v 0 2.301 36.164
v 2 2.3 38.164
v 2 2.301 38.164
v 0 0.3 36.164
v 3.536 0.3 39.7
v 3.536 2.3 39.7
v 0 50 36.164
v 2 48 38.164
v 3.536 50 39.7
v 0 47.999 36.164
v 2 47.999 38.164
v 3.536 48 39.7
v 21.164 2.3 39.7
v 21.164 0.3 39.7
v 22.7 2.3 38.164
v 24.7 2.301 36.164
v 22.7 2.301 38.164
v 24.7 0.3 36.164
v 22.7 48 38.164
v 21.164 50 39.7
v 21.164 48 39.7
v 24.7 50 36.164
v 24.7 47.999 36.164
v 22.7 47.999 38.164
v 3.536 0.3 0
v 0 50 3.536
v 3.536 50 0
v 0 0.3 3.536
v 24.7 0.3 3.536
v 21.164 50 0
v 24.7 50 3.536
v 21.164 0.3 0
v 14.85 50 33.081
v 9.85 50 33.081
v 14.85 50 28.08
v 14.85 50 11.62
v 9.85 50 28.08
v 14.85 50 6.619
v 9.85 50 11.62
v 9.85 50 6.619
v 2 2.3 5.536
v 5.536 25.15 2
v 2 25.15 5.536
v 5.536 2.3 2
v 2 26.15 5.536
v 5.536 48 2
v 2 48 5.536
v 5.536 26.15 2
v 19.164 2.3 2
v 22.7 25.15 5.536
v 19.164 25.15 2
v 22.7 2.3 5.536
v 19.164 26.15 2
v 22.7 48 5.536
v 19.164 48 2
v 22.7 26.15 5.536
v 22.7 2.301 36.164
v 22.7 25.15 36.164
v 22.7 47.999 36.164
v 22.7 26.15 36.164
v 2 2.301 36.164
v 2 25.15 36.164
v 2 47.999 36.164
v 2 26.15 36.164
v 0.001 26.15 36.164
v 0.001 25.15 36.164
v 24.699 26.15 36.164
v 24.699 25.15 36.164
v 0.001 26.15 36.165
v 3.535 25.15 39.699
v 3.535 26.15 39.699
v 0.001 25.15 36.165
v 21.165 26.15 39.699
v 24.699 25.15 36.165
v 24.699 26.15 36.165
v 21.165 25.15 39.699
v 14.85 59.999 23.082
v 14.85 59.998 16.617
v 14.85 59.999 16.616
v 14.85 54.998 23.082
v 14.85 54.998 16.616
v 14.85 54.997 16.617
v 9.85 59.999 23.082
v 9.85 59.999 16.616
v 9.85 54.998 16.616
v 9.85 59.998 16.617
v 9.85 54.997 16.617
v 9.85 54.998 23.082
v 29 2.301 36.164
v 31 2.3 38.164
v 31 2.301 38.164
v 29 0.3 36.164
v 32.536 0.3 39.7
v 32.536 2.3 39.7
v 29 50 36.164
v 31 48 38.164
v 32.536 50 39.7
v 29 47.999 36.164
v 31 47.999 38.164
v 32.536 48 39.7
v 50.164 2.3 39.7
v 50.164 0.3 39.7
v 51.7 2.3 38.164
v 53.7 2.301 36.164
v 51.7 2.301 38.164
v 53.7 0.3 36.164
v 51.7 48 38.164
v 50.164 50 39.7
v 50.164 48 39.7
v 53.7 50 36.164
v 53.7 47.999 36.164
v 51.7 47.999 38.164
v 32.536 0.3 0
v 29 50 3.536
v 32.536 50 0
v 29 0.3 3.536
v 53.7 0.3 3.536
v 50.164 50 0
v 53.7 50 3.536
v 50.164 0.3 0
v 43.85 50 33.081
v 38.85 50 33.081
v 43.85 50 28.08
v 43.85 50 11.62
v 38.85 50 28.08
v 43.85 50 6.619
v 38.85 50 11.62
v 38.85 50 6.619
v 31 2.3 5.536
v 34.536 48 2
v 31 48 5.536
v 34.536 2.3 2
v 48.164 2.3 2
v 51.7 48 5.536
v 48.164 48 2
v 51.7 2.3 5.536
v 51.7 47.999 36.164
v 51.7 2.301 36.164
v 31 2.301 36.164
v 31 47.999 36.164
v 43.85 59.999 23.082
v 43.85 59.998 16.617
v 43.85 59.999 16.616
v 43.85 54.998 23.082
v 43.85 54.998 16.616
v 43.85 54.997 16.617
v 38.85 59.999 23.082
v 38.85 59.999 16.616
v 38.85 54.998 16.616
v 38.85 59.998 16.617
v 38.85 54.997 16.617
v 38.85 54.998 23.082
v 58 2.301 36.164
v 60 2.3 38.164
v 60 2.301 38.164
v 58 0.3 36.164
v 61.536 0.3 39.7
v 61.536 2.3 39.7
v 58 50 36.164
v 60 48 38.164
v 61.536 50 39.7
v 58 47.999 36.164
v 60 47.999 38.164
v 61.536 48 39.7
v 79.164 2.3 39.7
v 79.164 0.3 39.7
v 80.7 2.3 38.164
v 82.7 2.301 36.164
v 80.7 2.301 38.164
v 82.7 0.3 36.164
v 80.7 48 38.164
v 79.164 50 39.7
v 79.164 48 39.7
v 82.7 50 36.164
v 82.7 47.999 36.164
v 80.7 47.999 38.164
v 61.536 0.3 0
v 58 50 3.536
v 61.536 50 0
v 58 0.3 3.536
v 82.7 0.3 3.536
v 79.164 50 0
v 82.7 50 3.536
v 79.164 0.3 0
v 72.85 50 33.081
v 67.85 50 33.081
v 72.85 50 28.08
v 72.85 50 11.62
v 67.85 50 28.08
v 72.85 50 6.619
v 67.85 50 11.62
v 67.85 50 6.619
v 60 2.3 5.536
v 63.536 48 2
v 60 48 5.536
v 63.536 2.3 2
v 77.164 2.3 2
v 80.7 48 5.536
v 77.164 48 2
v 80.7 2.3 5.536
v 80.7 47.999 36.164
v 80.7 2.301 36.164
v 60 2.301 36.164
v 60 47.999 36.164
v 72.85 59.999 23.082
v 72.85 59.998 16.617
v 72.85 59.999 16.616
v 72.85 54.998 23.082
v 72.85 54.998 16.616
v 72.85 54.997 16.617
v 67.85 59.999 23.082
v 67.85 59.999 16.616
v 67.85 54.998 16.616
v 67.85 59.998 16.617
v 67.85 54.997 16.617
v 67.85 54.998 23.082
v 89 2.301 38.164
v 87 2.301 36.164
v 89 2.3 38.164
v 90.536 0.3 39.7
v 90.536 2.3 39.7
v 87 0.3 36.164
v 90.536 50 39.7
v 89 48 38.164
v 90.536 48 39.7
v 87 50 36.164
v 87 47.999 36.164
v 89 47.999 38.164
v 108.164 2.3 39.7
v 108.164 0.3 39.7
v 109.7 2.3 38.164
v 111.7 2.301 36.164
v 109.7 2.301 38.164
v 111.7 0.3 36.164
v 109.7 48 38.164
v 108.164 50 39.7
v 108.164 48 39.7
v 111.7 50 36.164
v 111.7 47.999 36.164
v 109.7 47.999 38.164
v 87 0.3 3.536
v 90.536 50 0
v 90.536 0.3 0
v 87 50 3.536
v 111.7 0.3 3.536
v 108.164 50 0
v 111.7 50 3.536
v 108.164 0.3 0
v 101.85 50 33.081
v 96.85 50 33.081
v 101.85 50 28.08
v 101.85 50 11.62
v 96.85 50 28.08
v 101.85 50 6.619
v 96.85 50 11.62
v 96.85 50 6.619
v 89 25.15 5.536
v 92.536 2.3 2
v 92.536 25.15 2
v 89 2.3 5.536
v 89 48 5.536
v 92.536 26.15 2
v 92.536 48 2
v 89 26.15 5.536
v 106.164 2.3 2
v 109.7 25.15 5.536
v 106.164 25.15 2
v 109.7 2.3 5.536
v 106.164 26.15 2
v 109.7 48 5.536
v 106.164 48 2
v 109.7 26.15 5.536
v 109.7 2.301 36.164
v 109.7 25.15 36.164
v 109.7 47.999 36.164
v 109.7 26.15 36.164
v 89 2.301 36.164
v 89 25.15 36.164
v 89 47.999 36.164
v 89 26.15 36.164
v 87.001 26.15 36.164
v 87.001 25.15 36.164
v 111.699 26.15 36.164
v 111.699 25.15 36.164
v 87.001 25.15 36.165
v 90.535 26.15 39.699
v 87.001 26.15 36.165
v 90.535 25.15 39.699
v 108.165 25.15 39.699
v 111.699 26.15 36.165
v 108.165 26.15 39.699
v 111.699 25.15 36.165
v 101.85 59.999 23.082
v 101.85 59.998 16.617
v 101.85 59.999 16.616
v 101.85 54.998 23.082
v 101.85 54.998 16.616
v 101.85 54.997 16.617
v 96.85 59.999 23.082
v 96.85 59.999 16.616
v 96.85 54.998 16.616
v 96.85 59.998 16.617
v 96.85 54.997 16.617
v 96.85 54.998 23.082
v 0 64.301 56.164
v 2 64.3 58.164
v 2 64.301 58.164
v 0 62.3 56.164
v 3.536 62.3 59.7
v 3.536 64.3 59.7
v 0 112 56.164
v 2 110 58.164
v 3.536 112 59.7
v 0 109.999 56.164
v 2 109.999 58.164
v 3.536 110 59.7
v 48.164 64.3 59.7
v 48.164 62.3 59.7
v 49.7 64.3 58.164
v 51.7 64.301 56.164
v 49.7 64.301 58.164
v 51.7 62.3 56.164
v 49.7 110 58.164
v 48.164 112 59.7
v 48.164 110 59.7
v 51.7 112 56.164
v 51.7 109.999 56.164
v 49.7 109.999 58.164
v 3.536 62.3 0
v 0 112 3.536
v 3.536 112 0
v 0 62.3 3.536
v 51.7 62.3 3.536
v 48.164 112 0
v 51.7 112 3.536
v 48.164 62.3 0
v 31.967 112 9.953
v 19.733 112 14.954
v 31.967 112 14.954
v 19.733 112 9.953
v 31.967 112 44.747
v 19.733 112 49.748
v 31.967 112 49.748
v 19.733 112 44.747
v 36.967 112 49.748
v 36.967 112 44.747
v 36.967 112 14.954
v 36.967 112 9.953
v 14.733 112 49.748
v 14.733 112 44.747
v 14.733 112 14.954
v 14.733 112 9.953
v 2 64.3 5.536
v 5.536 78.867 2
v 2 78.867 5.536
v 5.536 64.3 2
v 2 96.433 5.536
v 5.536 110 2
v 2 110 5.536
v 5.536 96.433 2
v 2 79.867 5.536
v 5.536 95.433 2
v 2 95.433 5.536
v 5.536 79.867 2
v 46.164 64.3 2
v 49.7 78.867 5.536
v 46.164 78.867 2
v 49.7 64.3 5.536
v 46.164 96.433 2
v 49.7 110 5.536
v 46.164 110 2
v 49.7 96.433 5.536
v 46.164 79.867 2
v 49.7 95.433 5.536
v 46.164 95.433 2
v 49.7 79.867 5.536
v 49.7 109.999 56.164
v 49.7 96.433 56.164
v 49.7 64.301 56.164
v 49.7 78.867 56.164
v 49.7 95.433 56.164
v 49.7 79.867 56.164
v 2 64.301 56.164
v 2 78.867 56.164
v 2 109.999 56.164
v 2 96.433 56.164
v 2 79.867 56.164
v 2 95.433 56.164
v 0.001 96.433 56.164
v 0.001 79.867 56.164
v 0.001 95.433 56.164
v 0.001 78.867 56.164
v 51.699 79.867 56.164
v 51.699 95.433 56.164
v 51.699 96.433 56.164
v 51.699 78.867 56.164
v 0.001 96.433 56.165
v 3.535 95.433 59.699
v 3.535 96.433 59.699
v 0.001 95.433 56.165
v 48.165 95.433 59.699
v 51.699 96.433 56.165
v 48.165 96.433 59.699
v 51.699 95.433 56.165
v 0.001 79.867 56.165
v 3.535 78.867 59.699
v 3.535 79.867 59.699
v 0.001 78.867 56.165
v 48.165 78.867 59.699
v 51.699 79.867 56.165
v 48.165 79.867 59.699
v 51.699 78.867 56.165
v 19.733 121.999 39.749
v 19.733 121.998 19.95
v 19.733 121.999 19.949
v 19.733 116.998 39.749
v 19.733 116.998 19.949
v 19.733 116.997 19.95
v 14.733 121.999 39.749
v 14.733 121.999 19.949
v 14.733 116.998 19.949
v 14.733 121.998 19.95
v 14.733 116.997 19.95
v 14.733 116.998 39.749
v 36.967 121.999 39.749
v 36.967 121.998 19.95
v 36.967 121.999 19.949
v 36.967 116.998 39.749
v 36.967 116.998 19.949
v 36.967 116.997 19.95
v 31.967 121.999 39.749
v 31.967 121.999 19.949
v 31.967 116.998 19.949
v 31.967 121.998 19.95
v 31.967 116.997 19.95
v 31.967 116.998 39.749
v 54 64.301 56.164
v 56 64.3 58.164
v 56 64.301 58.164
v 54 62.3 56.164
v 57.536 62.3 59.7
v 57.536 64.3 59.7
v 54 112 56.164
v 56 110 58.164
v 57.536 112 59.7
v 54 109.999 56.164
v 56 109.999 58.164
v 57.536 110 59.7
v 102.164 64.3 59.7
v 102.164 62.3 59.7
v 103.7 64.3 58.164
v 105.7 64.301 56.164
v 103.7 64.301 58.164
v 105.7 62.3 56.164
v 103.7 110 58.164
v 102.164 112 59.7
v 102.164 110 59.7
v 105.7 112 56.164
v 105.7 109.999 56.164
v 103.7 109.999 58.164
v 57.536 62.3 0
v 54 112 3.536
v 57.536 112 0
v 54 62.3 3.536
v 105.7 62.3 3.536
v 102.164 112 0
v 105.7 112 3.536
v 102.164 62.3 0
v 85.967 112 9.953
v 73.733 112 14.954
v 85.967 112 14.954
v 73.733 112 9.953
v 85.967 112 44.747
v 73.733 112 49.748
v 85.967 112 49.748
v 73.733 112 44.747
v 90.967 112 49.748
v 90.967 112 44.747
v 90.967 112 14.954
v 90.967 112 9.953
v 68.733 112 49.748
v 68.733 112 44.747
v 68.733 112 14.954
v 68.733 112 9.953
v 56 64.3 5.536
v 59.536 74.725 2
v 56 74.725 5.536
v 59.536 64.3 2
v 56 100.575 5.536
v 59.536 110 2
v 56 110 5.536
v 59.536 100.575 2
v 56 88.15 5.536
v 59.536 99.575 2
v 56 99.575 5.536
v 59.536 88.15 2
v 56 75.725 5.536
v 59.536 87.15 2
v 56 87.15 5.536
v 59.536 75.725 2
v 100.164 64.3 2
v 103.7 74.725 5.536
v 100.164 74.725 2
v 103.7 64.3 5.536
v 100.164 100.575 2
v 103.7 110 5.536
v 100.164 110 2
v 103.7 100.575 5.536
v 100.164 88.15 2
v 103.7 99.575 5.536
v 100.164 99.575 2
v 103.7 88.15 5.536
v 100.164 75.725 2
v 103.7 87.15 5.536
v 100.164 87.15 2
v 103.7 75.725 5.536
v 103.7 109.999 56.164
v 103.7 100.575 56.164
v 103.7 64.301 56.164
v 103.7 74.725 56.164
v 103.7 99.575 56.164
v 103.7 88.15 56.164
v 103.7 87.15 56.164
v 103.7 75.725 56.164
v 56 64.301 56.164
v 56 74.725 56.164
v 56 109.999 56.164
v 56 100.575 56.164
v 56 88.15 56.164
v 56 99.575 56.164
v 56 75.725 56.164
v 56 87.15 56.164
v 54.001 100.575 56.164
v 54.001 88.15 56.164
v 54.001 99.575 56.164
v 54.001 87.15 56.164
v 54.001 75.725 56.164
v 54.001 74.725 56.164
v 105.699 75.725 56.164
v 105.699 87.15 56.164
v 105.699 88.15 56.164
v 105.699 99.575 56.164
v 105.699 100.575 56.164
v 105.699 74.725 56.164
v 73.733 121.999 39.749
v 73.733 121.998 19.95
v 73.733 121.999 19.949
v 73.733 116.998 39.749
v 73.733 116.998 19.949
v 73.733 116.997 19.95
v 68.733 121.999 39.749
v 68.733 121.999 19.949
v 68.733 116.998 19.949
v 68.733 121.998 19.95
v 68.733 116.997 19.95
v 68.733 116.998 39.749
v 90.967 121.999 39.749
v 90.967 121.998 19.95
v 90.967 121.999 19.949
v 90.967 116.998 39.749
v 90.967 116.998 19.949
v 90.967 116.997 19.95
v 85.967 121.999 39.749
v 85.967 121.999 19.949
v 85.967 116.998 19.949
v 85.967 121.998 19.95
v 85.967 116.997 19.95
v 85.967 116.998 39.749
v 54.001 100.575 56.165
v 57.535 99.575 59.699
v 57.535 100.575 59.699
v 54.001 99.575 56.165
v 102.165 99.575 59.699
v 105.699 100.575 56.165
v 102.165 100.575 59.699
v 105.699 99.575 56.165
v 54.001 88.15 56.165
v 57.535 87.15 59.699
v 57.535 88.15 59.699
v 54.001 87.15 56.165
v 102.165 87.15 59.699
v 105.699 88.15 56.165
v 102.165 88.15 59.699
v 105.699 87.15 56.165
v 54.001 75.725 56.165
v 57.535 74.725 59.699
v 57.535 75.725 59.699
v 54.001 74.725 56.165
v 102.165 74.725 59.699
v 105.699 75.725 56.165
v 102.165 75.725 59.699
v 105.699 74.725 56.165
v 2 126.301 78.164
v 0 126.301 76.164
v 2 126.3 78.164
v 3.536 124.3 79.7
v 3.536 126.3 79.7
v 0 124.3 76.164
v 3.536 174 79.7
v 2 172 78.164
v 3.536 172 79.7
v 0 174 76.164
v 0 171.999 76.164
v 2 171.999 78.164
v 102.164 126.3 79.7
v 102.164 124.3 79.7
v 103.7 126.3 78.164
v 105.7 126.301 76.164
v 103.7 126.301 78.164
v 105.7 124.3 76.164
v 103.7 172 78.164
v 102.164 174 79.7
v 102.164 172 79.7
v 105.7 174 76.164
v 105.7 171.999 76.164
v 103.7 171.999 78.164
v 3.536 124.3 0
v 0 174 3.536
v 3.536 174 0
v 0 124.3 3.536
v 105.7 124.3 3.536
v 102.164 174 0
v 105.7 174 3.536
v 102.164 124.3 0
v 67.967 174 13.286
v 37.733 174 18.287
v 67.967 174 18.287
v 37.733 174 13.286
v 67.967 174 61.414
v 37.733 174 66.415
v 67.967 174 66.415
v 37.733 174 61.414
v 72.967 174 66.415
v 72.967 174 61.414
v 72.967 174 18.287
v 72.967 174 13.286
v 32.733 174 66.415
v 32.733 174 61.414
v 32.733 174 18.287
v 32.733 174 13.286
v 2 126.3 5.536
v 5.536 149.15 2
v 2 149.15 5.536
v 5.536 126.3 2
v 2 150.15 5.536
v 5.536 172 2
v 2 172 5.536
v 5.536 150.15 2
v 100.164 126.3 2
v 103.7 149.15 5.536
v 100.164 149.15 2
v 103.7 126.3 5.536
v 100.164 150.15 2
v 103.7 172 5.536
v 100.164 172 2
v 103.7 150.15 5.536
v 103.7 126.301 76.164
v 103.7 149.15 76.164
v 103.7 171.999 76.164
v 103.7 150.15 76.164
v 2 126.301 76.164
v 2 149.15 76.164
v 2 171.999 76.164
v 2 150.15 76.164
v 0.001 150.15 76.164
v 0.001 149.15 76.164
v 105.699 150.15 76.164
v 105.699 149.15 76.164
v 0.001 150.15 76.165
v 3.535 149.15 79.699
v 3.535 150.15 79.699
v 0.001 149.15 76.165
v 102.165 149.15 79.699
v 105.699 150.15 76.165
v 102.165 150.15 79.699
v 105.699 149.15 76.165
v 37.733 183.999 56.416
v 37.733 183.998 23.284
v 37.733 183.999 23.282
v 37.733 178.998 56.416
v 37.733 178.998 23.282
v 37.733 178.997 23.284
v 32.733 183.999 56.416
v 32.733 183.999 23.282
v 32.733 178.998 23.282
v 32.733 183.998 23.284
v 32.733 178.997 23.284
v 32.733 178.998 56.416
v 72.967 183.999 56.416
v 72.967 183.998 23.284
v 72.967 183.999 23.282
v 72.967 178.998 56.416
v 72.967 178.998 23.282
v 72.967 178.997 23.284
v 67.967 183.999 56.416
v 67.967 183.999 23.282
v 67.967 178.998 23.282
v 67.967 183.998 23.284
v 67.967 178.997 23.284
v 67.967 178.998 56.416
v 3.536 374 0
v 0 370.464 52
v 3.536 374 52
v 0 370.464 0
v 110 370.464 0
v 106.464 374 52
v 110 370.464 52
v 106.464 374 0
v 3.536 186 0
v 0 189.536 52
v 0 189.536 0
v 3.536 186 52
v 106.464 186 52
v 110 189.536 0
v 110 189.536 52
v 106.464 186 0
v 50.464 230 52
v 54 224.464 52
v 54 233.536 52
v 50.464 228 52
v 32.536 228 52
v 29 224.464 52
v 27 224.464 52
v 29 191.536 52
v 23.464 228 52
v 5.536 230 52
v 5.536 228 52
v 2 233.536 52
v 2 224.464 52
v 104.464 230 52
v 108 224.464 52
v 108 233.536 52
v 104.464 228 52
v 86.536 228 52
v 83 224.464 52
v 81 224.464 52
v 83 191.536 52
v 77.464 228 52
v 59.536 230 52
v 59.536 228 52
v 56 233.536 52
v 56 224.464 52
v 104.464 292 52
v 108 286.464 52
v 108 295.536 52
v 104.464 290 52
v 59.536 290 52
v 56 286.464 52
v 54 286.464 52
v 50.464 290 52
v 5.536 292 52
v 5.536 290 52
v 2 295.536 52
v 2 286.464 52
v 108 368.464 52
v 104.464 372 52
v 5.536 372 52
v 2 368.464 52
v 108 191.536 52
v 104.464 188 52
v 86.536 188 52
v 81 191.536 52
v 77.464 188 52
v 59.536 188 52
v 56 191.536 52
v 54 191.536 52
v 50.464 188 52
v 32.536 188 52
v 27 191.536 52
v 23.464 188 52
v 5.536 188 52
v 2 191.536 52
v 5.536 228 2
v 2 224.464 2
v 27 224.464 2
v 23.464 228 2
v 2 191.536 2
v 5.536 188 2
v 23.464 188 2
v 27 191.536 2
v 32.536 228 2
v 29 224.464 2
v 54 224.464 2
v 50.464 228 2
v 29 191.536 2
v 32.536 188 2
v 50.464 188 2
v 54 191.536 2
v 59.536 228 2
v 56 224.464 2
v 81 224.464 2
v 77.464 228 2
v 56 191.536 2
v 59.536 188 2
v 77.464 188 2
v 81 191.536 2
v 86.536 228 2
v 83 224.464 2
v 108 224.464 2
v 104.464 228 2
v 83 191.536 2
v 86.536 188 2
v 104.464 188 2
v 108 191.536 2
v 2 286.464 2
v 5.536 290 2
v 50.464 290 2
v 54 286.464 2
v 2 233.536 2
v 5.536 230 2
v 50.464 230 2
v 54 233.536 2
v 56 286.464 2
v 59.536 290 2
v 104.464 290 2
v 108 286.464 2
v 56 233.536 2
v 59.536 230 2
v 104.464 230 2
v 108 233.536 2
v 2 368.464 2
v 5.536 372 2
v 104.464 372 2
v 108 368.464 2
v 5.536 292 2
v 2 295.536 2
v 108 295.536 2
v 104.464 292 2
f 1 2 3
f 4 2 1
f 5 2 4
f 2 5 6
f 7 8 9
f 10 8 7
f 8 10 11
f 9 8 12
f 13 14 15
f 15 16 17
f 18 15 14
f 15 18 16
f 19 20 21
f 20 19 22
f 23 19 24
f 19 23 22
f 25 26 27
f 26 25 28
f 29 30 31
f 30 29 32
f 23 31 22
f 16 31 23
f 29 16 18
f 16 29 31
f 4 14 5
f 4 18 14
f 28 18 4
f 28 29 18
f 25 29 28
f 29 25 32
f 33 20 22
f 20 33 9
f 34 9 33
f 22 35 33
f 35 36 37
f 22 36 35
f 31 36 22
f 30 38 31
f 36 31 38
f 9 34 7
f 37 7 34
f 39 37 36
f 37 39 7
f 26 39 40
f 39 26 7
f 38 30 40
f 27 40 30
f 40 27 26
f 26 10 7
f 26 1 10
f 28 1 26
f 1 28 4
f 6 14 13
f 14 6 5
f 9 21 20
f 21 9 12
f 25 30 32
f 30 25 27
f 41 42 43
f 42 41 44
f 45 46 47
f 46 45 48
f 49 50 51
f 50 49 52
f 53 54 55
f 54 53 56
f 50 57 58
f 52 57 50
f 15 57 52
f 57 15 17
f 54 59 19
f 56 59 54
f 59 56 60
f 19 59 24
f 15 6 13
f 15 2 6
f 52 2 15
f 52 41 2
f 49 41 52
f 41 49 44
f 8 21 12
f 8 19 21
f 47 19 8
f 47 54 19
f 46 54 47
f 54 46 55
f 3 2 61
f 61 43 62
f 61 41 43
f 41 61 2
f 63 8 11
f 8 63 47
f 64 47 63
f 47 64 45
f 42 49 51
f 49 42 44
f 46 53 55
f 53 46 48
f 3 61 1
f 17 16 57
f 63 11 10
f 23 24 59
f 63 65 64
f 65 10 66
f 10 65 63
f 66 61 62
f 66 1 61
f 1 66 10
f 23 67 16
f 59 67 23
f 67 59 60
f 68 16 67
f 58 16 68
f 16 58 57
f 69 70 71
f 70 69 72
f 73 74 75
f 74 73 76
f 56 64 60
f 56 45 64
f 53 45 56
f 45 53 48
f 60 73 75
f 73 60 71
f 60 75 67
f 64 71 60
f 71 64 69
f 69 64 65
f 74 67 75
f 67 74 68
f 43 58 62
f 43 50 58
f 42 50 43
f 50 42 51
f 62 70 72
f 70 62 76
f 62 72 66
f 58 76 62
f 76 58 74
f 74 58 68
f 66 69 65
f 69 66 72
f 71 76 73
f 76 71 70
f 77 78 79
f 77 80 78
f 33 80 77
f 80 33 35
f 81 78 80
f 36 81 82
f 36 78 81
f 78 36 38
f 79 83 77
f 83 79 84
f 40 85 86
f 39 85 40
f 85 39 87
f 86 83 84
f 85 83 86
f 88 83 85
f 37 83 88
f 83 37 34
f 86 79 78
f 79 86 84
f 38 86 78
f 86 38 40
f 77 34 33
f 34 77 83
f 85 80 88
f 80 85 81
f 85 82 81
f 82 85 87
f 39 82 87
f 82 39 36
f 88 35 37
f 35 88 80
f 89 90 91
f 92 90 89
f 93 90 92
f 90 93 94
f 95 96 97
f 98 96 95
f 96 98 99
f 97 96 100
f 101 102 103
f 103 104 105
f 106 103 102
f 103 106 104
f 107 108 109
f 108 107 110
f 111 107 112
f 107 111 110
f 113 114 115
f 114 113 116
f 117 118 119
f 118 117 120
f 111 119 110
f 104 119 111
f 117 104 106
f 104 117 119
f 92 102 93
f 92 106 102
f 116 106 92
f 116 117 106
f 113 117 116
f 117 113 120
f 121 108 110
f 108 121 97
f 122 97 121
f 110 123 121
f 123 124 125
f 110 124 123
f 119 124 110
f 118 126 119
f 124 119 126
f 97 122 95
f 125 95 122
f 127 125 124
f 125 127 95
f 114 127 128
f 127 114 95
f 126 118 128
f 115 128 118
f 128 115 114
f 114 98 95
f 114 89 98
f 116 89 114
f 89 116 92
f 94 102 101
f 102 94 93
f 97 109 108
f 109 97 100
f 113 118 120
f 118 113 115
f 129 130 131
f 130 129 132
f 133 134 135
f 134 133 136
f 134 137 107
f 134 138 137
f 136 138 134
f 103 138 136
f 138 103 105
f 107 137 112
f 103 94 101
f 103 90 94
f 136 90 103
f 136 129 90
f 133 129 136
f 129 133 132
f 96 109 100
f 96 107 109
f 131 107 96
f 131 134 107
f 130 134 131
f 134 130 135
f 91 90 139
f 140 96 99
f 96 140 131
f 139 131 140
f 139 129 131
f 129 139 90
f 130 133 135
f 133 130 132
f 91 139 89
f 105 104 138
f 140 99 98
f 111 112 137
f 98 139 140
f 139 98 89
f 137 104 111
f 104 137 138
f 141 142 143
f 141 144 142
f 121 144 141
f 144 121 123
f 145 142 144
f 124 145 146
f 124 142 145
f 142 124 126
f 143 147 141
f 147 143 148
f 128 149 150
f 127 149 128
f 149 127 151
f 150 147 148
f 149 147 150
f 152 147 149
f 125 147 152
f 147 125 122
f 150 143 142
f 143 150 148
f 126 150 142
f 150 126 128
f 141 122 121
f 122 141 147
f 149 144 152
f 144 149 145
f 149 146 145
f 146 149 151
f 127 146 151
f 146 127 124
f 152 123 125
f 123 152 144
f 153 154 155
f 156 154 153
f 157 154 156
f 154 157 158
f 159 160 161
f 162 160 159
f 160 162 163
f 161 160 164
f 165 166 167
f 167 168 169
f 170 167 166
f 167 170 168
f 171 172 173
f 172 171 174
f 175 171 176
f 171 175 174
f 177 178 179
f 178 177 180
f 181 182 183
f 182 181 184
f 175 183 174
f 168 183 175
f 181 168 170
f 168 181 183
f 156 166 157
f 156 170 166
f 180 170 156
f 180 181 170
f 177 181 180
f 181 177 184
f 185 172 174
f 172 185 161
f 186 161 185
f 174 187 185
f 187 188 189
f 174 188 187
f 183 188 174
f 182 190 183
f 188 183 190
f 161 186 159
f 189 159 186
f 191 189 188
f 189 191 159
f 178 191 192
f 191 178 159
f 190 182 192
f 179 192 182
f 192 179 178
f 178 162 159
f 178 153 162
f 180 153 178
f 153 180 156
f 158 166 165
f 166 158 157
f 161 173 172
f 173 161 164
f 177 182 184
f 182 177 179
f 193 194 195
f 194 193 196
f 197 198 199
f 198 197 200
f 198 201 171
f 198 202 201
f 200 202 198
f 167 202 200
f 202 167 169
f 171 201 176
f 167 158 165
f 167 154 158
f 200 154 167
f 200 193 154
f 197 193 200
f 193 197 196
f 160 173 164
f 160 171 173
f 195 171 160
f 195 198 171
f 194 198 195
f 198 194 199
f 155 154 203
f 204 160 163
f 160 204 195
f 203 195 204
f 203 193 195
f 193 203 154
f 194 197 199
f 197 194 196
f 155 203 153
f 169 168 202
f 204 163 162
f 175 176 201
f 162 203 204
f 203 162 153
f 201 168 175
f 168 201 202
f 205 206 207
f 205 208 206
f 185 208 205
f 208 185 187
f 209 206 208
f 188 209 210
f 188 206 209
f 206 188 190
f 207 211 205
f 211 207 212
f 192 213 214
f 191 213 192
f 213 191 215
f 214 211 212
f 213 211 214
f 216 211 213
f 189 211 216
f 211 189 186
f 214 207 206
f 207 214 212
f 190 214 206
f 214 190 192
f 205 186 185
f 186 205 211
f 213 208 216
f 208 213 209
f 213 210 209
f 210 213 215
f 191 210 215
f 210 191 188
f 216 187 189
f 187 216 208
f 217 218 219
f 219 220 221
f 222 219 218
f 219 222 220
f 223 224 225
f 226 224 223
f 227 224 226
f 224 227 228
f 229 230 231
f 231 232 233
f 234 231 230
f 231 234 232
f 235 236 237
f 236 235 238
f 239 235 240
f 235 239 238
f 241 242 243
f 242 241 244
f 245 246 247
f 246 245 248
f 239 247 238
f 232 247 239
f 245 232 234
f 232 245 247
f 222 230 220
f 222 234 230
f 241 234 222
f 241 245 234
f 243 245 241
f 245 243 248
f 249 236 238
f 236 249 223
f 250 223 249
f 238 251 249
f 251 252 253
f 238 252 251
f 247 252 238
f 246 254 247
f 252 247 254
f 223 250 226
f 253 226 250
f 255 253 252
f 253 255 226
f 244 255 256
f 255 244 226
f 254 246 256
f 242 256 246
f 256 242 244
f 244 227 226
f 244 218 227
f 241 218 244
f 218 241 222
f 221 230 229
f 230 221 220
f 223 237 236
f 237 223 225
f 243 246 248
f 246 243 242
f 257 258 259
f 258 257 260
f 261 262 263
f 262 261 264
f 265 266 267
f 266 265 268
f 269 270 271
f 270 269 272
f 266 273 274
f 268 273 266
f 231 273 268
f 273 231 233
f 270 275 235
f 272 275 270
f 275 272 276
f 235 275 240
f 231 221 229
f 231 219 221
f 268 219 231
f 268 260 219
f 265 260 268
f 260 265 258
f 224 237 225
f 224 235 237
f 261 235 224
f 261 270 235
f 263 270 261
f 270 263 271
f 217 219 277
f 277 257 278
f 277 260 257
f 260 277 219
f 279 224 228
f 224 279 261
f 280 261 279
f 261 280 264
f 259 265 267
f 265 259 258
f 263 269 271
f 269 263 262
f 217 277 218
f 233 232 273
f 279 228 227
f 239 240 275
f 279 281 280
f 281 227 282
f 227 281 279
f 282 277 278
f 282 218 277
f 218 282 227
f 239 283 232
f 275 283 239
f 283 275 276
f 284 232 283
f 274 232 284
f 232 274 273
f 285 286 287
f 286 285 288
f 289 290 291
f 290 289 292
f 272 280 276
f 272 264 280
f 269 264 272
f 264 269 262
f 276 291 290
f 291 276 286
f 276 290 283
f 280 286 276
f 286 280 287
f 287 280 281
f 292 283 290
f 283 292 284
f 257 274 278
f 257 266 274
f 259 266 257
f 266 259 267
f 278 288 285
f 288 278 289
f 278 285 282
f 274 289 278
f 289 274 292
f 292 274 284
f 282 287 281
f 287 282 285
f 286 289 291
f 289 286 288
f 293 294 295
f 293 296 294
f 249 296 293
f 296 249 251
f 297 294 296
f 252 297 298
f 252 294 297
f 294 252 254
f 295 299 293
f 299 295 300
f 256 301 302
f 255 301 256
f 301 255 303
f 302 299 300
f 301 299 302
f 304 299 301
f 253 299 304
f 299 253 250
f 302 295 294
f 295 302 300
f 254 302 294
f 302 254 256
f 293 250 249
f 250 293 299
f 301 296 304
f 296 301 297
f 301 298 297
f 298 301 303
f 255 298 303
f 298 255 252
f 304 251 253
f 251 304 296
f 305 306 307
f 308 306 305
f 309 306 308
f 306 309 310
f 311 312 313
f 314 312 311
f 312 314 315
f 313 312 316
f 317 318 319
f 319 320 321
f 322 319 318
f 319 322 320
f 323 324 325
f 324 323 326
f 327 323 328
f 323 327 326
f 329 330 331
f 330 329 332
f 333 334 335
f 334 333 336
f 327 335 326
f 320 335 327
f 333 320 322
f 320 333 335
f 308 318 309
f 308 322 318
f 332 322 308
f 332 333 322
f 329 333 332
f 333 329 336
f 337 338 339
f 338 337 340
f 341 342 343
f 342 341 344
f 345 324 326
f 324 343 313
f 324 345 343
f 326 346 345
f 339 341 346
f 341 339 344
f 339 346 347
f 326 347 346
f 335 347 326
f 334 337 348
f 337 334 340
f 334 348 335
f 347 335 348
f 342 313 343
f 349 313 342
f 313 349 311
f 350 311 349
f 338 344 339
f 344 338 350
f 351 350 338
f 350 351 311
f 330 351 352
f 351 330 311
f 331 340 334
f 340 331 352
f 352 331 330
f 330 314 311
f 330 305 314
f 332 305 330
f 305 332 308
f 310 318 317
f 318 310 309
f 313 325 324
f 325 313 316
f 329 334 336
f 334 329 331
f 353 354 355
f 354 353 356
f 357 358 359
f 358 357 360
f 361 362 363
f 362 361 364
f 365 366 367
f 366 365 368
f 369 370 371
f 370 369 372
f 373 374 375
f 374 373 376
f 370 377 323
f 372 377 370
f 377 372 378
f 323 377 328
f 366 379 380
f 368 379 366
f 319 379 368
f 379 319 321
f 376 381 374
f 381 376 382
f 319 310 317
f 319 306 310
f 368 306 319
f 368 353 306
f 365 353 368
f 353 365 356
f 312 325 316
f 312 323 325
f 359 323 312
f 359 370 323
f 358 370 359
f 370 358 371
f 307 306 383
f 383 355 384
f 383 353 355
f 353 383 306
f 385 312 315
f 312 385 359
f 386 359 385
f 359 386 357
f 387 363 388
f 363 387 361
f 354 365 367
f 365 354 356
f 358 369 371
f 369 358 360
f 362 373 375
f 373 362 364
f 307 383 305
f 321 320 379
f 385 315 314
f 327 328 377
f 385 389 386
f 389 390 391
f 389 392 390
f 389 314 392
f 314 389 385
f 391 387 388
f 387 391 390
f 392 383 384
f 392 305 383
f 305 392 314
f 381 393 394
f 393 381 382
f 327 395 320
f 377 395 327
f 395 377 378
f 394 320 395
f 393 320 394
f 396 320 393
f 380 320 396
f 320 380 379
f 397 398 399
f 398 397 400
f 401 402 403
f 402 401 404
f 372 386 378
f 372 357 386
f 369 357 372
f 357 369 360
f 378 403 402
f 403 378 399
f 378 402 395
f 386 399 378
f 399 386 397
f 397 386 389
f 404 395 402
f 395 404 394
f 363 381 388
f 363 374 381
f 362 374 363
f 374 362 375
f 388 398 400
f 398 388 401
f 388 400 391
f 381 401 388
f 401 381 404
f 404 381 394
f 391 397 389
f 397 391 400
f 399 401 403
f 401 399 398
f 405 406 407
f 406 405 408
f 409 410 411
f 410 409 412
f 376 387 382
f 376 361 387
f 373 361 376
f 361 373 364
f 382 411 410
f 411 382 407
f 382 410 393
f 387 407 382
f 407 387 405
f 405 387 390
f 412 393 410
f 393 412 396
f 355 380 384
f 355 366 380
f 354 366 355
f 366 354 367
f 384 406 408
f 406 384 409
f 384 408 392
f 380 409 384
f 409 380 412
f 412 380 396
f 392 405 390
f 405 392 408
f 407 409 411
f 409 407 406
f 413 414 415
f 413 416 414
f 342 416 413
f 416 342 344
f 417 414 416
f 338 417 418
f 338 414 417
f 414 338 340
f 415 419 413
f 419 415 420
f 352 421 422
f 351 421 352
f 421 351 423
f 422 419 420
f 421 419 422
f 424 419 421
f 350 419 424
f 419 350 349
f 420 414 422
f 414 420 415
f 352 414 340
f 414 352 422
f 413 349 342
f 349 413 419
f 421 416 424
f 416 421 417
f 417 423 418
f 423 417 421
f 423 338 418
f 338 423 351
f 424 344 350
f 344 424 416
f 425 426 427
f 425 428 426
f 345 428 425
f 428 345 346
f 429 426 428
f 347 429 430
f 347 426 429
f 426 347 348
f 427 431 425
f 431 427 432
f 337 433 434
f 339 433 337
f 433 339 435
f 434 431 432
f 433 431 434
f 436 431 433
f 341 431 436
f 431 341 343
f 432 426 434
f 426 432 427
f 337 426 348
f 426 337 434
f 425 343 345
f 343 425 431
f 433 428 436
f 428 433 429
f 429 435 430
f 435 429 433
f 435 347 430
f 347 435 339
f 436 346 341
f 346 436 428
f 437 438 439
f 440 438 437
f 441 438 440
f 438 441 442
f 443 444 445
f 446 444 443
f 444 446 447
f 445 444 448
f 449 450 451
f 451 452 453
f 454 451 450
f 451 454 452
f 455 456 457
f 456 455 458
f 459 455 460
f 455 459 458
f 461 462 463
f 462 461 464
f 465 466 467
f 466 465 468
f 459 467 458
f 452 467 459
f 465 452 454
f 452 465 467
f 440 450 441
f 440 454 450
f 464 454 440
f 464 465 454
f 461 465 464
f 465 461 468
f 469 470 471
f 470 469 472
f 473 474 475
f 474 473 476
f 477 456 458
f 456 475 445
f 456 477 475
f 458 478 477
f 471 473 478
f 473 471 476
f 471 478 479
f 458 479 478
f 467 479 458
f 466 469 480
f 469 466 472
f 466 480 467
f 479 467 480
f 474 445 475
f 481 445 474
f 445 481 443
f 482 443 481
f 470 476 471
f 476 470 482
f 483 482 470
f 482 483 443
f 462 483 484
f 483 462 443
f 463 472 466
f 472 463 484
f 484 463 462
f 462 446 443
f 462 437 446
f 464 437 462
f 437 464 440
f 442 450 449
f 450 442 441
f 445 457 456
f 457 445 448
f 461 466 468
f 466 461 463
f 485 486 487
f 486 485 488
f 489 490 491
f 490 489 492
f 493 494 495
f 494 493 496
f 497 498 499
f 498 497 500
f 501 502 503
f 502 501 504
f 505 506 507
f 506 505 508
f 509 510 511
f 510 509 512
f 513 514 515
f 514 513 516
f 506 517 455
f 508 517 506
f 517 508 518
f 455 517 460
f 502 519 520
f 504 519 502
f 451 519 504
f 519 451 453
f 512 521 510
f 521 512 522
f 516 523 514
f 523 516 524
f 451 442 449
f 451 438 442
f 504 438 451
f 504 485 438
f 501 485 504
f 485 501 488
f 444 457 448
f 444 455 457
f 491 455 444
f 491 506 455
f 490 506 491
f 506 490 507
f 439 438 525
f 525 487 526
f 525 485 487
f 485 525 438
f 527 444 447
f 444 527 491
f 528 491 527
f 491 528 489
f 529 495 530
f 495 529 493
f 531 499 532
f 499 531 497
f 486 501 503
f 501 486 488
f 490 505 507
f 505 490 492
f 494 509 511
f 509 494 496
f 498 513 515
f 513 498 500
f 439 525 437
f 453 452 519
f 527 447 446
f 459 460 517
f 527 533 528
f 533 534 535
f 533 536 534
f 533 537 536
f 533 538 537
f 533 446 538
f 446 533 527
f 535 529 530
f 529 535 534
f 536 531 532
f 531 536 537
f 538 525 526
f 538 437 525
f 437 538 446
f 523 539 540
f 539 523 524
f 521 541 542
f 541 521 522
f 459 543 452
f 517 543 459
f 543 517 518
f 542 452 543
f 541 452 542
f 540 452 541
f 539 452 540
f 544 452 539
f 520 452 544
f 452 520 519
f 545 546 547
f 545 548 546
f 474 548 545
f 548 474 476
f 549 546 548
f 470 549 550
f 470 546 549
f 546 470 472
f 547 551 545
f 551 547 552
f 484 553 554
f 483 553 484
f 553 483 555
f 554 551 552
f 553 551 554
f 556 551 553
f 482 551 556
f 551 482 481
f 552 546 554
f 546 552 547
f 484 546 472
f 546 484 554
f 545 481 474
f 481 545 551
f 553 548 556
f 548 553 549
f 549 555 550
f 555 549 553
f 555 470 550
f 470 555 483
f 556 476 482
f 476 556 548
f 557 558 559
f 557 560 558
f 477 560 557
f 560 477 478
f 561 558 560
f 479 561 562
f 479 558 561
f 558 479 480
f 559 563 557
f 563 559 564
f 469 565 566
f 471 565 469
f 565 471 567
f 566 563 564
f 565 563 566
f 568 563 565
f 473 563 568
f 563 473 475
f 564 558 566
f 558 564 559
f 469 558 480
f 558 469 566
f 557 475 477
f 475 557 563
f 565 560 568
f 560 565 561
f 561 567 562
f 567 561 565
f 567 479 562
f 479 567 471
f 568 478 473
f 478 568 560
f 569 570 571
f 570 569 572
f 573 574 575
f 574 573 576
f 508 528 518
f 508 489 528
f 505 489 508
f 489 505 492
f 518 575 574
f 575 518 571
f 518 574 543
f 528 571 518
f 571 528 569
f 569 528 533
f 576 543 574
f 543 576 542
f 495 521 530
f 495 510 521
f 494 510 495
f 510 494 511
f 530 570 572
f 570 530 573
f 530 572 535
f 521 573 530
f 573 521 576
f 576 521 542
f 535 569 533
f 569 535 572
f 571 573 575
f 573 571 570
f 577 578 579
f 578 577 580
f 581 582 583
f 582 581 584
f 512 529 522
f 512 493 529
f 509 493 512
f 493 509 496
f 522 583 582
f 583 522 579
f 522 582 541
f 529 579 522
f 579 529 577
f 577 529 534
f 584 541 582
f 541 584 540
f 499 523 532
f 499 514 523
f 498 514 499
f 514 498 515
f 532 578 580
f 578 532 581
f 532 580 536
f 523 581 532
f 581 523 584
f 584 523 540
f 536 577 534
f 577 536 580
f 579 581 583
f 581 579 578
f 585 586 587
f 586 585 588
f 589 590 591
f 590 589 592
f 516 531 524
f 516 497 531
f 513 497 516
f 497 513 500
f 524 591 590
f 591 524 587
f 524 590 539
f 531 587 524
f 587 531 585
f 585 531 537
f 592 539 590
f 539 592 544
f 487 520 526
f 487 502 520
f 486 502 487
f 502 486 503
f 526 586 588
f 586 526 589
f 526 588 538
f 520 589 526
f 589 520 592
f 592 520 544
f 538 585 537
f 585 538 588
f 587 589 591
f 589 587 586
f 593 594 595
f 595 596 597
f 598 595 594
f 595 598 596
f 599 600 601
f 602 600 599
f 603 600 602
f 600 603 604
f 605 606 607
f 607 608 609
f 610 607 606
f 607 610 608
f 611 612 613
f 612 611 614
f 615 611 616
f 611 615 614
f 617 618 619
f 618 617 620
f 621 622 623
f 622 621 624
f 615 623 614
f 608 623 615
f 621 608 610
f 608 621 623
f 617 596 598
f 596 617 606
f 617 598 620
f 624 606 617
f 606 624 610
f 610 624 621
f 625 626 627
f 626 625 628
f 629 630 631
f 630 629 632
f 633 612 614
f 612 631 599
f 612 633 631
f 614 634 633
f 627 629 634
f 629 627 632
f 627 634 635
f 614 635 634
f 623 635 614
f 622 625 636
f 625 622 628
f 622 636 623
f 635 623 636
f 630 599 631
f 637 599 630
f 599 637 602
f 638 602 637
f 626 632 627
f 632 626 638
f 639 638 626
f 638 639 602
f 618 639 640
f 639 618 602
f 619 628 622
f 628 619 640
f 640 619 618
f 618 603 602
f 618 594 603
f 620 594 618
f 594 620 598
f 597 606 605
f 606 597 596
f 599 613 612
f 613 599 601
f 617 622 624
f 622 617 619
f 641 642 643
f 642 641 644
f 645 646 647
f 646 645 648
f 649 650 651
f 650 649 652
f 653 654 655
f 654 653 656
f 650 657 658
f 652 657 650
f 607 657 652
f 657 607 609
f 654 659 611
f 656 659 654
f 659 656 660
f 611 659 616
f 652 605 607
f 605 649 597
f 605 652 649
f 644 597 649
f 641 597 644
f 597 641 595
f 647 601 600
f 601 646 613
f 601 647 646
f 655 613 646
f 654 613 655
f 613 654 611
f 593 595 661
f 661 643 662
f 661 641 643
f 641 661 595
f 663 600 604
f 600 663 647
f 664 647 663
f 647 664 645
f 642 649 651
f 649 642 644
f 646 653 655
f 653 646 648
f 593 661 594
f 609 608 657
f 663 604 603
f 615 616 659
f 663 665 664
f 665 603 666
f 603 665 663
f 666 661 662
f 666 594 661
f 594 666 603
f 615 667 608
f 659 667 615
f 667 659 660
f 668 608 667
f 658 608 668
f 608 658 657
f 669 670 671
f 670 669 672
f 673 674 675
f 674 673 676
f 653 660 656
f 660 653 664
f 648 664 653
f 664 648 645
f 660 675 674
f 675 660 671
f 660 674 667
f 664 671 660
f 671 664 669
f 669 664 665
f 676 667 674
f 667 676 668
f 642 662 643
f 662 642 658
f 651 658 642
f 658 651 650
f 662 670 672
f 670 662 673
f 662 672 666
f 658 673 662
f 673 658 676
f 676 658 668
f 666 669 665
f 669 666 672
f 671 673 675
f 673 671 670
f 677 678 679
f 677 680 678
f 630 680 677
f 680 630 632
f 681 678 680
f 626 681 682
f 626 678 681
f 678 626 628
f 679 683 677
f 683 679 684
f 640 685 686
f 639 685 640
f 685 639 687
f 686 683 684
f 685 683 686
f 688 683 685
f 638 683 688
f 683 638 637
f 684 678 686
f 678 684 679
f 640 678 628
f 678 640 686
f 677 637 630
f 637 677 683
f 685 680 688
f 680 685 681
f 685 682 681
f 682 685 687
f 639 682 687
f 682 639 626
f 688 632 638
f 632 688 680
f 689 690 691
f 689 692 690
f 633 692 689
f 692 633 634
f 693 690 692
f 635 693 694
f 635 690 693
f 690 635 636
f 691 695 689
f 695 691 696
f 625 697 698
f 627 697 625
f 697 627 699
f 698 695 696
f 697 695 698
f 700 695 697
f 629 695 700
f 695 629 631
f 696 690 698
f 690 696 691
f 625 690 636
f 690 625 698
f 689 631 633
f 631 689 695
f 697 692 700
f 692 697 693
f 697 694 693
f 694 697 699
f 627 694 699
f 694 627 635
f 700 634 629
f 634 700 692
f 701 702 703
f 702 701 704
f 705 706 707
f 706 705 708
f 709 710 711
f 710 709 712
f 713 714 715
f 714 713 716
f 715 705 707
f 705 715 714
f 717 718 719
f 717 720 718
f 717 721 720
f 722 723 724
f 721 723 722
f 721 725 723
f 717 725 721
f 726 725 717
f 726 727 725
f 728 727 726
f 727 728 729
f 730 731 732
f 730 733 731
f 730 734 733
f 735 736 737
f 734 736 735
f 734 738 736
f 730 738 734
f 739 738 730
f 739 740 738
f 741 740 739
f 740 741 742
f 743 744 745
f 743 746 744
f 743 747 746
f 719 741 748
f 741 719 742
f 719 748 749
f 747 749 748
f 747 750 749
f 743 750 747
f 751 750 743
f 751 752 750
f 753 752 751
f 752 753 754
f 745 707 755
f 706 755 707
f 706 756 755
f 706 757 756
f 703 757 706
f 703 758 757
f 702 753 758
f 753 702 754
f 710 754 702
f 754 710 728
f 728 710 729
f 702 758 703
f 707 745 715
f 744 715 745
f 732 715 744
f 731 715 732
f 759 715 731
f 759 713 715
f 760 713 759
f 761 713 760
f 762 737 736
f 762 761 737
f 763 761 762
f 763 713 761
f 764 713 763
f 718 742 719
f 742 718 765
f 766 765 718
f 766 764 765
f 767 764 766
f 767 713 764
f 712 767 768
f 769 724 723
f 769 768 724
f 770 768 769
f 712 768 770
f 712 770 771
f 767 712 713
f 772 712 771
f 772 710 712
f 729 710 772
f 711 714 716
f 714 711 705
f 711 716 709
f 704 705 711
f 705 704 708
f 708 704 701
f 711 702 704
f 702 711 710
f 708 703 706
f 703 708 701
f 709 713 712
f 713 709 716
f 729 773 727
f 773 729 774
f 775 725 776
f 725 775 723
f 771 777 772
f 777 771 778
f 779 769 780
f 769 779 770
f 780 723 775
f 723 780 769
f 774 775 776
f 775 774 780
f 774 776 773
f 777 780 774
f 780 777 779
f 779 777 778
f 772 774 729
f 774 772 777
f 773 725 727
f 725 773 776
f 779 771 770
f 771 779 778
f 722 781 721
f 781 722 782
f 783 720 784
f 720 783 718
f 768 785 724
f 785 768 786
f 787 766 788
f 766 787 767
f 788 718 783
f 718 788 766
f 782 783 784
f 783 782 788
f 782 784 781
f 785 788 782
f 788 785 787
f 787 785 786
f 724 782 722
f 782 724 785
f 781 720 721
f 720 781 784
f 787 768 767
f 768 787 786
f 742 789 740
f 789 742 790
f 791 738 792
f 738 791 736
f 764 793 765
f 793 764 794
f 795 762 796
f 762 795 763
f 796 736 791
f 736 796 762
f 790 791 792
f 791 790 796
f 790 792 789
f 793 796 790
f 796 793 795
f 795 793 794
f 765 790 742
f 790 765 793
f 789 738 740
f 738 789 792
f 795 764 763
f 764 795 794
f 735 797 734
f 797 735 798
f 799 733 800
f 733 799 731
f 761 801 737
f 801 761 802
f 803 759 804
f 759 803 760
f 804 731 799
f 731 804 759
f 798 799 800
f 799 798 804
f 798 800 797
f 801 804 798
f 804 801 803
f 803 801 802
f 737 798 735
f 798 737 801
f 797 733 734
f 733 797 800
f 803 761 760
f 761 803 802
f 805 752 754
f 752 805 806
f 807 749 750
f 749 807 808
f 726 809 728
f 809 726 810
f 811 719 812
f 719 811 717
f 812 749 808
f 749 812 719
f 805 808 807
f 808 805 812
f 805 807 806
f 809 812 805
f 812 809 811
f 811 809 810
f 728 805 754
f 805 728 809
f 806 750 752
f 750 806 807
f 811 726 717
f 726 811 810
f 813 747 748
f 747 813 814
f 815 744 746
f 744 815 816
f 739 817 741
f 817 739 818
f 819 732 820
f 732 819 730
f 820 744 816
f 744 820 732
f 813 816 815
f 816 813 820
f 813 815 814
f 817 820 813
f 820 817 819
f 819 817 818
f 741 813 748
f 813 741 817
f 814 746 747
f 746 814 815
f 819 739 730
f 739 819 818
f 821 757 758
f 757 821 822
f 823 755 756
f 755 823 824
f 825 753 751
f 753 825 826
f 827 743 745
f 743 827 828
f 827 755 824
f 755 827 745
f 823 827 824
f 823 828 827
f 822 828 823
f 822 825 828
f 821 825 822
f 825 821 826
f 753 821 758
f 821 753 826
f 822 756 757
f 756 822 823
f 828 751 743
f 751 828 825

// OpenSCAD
// preview[view:north west, tilt:top diagonal]

/* [Basics] */
// Units in mm that make up the width of the drawers
unit_width = 25; // [10:100]
// Units in mm that make up the height of the drawers
unit_height = 20; // [10:100]
// Depth front-to-back of all drawers in mm
unit_depth = 50; // [20:200]
// Thickness of handle in mm
handle_thickness=5; // [3:30]
// Depth of handle in mm
handle_depth=10; // [10:50]
// Thickness of the walls in mm (drawer walls and gap between drawers)
wall = 2; // [1:10]
// Size of bevel in mmon corners 
bevel = 5; // [0:20]
// Space in mm between components on the bed
print_space = 2;

/* [Drawers] */

// ## Complex example ##
// Unit width of each drawer
widths = [[1, 1, 1, 1], [2, 2], [4]];
// Unit height of each drawer
heights = [[2, 2, 2, 2], [3, 3], [4]];
// Number of dividers in each drawer
dividers = [[1, 0, 0, 1], [2, 3], [1]];
// Number of handles on the front of each drawer
handles = [[1, 1, 1, 1], [2, 2], [2]];

module simple_example() {
    // ## Simple example ##
    // Unit width of each drawer
    widths = [[1, 1], [2]];
    // Unit height of each drawer
    heights = [[1, 1], [1]];
    // Number of dividers in each drawer
    dividers = [[1, 1], [1]];
    // Number of handles on the front of each drawer
    handles = [[1, 1], [2]];
}

module super_simple_example() {
    // ## Super Simple Single Drawer example ##
    // Width in width units of each drawer
    widths = [[3]];
    // Height in height units of each drawer
    heights = [[4]];
    // Number of dividers in each drawer
    dividers = [[1]];
    // Number of handles on the front of each drawer
    handles = [[2]];
}

/* [Global] */
// What part(s) do you want to look at?
part = "both"; // [drawers:Drawers Only,frame:Frame Only,both:Drawers and Frame]

// Include the drawers
drawers = part == "drawers" || part == "both";
// Include the frame
frame = part == "frame" || part == "both";

module go() {
    // Tolerance space between sliding parts
    sliding_tol = 0.3;
    // Separator used to avoid congruent vertices/lines/planes
    sep = 0.001;
    hb = bevel / 2;

    // Flatten a vector of vectors
    function flatten(a) = [for (a = l) for (b = a) b];
    // Sum first n terms, defaults to all terms
    function sum(a, n=-1, i=0, t=0) = i < len(a) && i != n ? sum(a, n, i + 1, t + a[i]) : t;

    module bevel(depth) {
        // Build a subtractive bevel with x-section bevel squared and supplied depth 
        rotate(45) translate([-hb, -hb, -1]) cube([bevel, bevel, depth + 2]);
    }

    module bevel_box(width, height, depth, bevel, bevel_top=true) {
        // Build a box with a bevelled edge
        difference() {
            // Box
            cube([width, height, depth]);
            union() {
                // Bevels
                translate([0, 0, -1]) {
                    bevel(depth + 2);
                };
                translate([width, 0, -1]) {
                    bevel(depth + 2);
                };
                if (bevel_top) {
                    translate([0, height, -1]) {
                        bevel(depth + 2);
                    };
                    translate([width, height, -1]) {
                        bevel(depth + 2);
                    };
                }
            };
        }
    }

    module bevel_divider(drawer_id, divider_id, width, height, depth, bevel) {
        // build a bevel divider for given drawer
        // Depth is the mid point of the divider in the drawer
        // echo("Divider", drawer_id=drawer_id, divider_id=divider_id, width=width, height=height, depth=depth, bevel=bevel);
        translate([0, 0, depth])
        intersection() {
            difference() {
                bevel_box(width, height, unit_depth, bevel, true);
                // Keep from face of drawer
                translate([-sep, -sep, wall + sep])
                    cube([width + 2 * sep, height + 2 * sep, unit_depth]);
            }
            // Remove clashing vertices, edges and planes
            translate([sep, sep, -1]) 
                cube([width - 2 * sep, height - 2 * sep, 2]);
        }
    }

    module handle(drawer_id, handle_id, height, width, depth, thickness=handle_thickness) {
        // Build a handle with given width height and depth
        // Thickness is the handle size in mm
        // echo("Handle", drawer_id=drawer_id, handle_id=handle_id, height=height, width=width, depth=depth);
        
        module handle_shell(h, w, d, b) {
            // Build extruded trapezoid for handle
            difference() {
                cube([w, h, d]);
                translate([-sep, -sep, -d])
                    rotate([45, 0, 0]) 
                        cube([w + 2 * sep, b + 2 * sep, b]);
                translate([-sep, h - sep, -d])
                    rotate([45, 0, 0]) 
                        cube([w + 2 * sep, b + 2 * sep, b]);
            
            }
        }
        
        // Calculate the bevel edge length
        function bev(d, h) = pow(2 * pow(min(d, h/2), 2), 0.5);
        
        // Calculate handle cutout dimensions
        d2 = depth - thickness;
        h2 = height - 2 * thickness;
        // Calculate bevel size for exterior and interior
        b1 = bev(depth, height);
        b2 = bev(d2, h2);
        
        
        difference(){ 
            // Exterior of handle
            handle_shell(height, width, depth, b1);
            // Inner cut out of handle
            translate([-sep, thickness, thickness + sep]) 
                handle_shell(h2, width + 2 * sep, d2, b2);
        }
    }

    module lay() {
        // debug method
        if (true) {
            translate([0, unit_depth, 0])
                rotate([90, 0, 0])
                    children();
        } else {
            children();
        }
    }

    module drawer(id=1, width=1, height=1, handles=1, dividers=1, bevel=bevel, extra=0) {
        // Build a drawer with:
        //  width: mutiple of standard width
        //  height: mutiple of standard height
        //  handles: Given number of handles
        //  dividers: Number of drawer dividers
        //  bevel: Size of corner bevel
        //  extra: Extra value added to all dimensions for tolerances
        
        w = width * unit_width + (width - 1) * wall + extra;
        h = height * unit_height + extra;
        d = unit_depth + extra;
        // echo("Drawer", id=id, w=w, h=h, d=d);
        // echo(bevel=bevel, extra=extra);
        // echo(handles=handles, dividers=dividers);
        lay()
        union() {
            // Add drawer
            if (true) {
                difference() {
                    // Outer box
                    bevel_box(w, h, d, bevel);
                    // Inner space
                    translate([wall, wall, wall]) {
                        bevel_box(
                                w - 2 * wall, 
                                h + 2 * wall, 
                                d - 2 * wall,
                                bevel,
                                false);
                    };
                    hxb = pow(2 * pow(hb, 2), 0.5);
                    translate([-1, h - hxb, wall + sep]) {
                        cube([w + 2, hb + 2, d - 2 * wall - 2 * sep]);
                    }
                }
            }
            // Add dividers
            if (dividers > 0) {
                // echo(dividers=dividers);
                div_offset = d / (dividers + 1);
                for (divider = [0 + 1:dividers]) {
                    // echo(divider=divider);
                    bevel_divider(id, divider, w, h, div_offset * divider - wall / 2, bevel);
                }
            }
            // Add handles
            if (handles > 0) {
                // echo(handles=handles);
                handle_height = h / 1.5;
                handle_offset = w / (handles + 1);
                
                for (handle = [0 + 1:handles]) {
                    // echo(handle=handle);
                    offset_x = handle_offset * handle - handle_thickness / 2;
                    offset_y = (h - handle_height) / 2;
                    translate([offset_x, offset_y, -handle_depth + sep]) {
                        handle(id, handle, handle_height, handle_thickness, handle_depth);
                    }
                }
            }
        }
    }


    module build_drawers(widths, heights, dividers, handles) {
        // echo("===DRAWERS===");
        // Build each of the drawers
        for (row_id=[0:len(widths) - 1]) {
            row_widths = widths[row_id];
            row_heights = heights[row_id];
            row_dividers = dividers[row_id];
            row_handles = handles[row_id];
            
            max_row_width = max(row_widths);
            translate([0, row_id * (unit_depth + handle_depth + print_space), 0]) {
                for (drawer_id=[0:len(row_widths) - 1]) {
                    drawer_widths = row_widths[drawer_id];
                    drawer_heights = row_heights[drawer_id];
                    drawer_divides = row_dividers[drawer_id];
                    drawer_handles = row_handles[drawer_id];

                    // echo(row_id=row_id, drawer_id=drawer_id);
                    // echo(widths=drawer_widths, dividers=drawer_divides, handles=drawer_handles);
                    x_offset = drawer_id * max_row_width * unit_width + drawer_id * (wall + print_space);
                    translate([x_offset, 0, 0]) {
                        drawer(
                            [row_id, drawer_id], 
                            width=drawer_widths, 
                            height=drawer_heights, 
                            handles=drawer_handles, 
                            dividers=drawer_divides,
                            extra=-sliding_tol);
                    }
                }
            }
        }
    }

    module build_frame(widths, heights) {
        // echo("===FRAME===");
        // Max drawer height on a row
        function row_height(n) = max(heights[n]);

        full_drawer_width = max([for (r = widths) sum(r)]);
        full_drawer_height = sum([for (r = heights) max(r)]);
        
        // echo(full_drawer_width=full_drawer_width, full_drawer_height=full_drawer_height);
        rows = len(widths);
        
        frame_width = full_drawer_width * unit_width + (full_drawer_width + 1) * wall;
        frame_height = full_drawer_height * unit_height + (rows + 1) * wall;
        frame_depth = unit_depth + wall;
        // echo(frame_width=frame_width);
        // echo(frame_height=frame_height);
        // echo(frame_depth=frame_depth);
        
        // Allow for the previously printed drawers
        offset_y = drawers ? rows * (unit_depth + handle_depth + print_space) : 0;
        translate([0, offset_y, 0]) {
            difference() {
                // Frame outline
                bevel_box(frame_width, frame_height, frame_depth);
                // All drawers
                union() {
                    for (row_id=[0:len(widths) - 1]) {
                        row_widths = widths[row_id];
                        row_heights = heights[row_id];
                        total_drawer_heights = row_id == 0 ? 0 : sum([for (x=[0:row_id - 1]) row_height(x) * unit_height]);
                        // echo(total_drawer_heights=total_drawer_heights);
                        row_offset = (row_id + 1) * wall + total_drawer_heights;
                        // echo(row_id=row_id, row_offset=row_offset);
                        translate([0, row_offset, wall]) {
                            for (drawer_id=[0:len(row_widths) - 1]) {
                                drawer_widths = row_widths[drawer_id];
                                drawer_heights = row_heights[drawer_id];
                                
                                previous_drawers = sum(row_widths, drawer_id);
                                col_offset = wall + previous_drawers*(unit_width + wall);
                                translate([col_offset, 0, 0]) {
                                    //echo(drawer_id=drawer_id, col_offset=col_offset);
                                    //echo(previous_drawers=previous_drawers);
                                    dw = drawer_widths * unit_width + (drawer_widths - 1) * wall;
                                    dh = drawer_heights * unit_height;
                                    bevel_box(dw, dh, unit_depth + 10);
                                }
                            }
                        }
                    }
                }
            }
        }
    }

    // Build and layout the drawers
    if (drawers)
        build_drawers(widths, heights, dividers, handles);
    
    // Build and layout the frame
    if (frame)
        build_frame(widths, heights);
}

go();
